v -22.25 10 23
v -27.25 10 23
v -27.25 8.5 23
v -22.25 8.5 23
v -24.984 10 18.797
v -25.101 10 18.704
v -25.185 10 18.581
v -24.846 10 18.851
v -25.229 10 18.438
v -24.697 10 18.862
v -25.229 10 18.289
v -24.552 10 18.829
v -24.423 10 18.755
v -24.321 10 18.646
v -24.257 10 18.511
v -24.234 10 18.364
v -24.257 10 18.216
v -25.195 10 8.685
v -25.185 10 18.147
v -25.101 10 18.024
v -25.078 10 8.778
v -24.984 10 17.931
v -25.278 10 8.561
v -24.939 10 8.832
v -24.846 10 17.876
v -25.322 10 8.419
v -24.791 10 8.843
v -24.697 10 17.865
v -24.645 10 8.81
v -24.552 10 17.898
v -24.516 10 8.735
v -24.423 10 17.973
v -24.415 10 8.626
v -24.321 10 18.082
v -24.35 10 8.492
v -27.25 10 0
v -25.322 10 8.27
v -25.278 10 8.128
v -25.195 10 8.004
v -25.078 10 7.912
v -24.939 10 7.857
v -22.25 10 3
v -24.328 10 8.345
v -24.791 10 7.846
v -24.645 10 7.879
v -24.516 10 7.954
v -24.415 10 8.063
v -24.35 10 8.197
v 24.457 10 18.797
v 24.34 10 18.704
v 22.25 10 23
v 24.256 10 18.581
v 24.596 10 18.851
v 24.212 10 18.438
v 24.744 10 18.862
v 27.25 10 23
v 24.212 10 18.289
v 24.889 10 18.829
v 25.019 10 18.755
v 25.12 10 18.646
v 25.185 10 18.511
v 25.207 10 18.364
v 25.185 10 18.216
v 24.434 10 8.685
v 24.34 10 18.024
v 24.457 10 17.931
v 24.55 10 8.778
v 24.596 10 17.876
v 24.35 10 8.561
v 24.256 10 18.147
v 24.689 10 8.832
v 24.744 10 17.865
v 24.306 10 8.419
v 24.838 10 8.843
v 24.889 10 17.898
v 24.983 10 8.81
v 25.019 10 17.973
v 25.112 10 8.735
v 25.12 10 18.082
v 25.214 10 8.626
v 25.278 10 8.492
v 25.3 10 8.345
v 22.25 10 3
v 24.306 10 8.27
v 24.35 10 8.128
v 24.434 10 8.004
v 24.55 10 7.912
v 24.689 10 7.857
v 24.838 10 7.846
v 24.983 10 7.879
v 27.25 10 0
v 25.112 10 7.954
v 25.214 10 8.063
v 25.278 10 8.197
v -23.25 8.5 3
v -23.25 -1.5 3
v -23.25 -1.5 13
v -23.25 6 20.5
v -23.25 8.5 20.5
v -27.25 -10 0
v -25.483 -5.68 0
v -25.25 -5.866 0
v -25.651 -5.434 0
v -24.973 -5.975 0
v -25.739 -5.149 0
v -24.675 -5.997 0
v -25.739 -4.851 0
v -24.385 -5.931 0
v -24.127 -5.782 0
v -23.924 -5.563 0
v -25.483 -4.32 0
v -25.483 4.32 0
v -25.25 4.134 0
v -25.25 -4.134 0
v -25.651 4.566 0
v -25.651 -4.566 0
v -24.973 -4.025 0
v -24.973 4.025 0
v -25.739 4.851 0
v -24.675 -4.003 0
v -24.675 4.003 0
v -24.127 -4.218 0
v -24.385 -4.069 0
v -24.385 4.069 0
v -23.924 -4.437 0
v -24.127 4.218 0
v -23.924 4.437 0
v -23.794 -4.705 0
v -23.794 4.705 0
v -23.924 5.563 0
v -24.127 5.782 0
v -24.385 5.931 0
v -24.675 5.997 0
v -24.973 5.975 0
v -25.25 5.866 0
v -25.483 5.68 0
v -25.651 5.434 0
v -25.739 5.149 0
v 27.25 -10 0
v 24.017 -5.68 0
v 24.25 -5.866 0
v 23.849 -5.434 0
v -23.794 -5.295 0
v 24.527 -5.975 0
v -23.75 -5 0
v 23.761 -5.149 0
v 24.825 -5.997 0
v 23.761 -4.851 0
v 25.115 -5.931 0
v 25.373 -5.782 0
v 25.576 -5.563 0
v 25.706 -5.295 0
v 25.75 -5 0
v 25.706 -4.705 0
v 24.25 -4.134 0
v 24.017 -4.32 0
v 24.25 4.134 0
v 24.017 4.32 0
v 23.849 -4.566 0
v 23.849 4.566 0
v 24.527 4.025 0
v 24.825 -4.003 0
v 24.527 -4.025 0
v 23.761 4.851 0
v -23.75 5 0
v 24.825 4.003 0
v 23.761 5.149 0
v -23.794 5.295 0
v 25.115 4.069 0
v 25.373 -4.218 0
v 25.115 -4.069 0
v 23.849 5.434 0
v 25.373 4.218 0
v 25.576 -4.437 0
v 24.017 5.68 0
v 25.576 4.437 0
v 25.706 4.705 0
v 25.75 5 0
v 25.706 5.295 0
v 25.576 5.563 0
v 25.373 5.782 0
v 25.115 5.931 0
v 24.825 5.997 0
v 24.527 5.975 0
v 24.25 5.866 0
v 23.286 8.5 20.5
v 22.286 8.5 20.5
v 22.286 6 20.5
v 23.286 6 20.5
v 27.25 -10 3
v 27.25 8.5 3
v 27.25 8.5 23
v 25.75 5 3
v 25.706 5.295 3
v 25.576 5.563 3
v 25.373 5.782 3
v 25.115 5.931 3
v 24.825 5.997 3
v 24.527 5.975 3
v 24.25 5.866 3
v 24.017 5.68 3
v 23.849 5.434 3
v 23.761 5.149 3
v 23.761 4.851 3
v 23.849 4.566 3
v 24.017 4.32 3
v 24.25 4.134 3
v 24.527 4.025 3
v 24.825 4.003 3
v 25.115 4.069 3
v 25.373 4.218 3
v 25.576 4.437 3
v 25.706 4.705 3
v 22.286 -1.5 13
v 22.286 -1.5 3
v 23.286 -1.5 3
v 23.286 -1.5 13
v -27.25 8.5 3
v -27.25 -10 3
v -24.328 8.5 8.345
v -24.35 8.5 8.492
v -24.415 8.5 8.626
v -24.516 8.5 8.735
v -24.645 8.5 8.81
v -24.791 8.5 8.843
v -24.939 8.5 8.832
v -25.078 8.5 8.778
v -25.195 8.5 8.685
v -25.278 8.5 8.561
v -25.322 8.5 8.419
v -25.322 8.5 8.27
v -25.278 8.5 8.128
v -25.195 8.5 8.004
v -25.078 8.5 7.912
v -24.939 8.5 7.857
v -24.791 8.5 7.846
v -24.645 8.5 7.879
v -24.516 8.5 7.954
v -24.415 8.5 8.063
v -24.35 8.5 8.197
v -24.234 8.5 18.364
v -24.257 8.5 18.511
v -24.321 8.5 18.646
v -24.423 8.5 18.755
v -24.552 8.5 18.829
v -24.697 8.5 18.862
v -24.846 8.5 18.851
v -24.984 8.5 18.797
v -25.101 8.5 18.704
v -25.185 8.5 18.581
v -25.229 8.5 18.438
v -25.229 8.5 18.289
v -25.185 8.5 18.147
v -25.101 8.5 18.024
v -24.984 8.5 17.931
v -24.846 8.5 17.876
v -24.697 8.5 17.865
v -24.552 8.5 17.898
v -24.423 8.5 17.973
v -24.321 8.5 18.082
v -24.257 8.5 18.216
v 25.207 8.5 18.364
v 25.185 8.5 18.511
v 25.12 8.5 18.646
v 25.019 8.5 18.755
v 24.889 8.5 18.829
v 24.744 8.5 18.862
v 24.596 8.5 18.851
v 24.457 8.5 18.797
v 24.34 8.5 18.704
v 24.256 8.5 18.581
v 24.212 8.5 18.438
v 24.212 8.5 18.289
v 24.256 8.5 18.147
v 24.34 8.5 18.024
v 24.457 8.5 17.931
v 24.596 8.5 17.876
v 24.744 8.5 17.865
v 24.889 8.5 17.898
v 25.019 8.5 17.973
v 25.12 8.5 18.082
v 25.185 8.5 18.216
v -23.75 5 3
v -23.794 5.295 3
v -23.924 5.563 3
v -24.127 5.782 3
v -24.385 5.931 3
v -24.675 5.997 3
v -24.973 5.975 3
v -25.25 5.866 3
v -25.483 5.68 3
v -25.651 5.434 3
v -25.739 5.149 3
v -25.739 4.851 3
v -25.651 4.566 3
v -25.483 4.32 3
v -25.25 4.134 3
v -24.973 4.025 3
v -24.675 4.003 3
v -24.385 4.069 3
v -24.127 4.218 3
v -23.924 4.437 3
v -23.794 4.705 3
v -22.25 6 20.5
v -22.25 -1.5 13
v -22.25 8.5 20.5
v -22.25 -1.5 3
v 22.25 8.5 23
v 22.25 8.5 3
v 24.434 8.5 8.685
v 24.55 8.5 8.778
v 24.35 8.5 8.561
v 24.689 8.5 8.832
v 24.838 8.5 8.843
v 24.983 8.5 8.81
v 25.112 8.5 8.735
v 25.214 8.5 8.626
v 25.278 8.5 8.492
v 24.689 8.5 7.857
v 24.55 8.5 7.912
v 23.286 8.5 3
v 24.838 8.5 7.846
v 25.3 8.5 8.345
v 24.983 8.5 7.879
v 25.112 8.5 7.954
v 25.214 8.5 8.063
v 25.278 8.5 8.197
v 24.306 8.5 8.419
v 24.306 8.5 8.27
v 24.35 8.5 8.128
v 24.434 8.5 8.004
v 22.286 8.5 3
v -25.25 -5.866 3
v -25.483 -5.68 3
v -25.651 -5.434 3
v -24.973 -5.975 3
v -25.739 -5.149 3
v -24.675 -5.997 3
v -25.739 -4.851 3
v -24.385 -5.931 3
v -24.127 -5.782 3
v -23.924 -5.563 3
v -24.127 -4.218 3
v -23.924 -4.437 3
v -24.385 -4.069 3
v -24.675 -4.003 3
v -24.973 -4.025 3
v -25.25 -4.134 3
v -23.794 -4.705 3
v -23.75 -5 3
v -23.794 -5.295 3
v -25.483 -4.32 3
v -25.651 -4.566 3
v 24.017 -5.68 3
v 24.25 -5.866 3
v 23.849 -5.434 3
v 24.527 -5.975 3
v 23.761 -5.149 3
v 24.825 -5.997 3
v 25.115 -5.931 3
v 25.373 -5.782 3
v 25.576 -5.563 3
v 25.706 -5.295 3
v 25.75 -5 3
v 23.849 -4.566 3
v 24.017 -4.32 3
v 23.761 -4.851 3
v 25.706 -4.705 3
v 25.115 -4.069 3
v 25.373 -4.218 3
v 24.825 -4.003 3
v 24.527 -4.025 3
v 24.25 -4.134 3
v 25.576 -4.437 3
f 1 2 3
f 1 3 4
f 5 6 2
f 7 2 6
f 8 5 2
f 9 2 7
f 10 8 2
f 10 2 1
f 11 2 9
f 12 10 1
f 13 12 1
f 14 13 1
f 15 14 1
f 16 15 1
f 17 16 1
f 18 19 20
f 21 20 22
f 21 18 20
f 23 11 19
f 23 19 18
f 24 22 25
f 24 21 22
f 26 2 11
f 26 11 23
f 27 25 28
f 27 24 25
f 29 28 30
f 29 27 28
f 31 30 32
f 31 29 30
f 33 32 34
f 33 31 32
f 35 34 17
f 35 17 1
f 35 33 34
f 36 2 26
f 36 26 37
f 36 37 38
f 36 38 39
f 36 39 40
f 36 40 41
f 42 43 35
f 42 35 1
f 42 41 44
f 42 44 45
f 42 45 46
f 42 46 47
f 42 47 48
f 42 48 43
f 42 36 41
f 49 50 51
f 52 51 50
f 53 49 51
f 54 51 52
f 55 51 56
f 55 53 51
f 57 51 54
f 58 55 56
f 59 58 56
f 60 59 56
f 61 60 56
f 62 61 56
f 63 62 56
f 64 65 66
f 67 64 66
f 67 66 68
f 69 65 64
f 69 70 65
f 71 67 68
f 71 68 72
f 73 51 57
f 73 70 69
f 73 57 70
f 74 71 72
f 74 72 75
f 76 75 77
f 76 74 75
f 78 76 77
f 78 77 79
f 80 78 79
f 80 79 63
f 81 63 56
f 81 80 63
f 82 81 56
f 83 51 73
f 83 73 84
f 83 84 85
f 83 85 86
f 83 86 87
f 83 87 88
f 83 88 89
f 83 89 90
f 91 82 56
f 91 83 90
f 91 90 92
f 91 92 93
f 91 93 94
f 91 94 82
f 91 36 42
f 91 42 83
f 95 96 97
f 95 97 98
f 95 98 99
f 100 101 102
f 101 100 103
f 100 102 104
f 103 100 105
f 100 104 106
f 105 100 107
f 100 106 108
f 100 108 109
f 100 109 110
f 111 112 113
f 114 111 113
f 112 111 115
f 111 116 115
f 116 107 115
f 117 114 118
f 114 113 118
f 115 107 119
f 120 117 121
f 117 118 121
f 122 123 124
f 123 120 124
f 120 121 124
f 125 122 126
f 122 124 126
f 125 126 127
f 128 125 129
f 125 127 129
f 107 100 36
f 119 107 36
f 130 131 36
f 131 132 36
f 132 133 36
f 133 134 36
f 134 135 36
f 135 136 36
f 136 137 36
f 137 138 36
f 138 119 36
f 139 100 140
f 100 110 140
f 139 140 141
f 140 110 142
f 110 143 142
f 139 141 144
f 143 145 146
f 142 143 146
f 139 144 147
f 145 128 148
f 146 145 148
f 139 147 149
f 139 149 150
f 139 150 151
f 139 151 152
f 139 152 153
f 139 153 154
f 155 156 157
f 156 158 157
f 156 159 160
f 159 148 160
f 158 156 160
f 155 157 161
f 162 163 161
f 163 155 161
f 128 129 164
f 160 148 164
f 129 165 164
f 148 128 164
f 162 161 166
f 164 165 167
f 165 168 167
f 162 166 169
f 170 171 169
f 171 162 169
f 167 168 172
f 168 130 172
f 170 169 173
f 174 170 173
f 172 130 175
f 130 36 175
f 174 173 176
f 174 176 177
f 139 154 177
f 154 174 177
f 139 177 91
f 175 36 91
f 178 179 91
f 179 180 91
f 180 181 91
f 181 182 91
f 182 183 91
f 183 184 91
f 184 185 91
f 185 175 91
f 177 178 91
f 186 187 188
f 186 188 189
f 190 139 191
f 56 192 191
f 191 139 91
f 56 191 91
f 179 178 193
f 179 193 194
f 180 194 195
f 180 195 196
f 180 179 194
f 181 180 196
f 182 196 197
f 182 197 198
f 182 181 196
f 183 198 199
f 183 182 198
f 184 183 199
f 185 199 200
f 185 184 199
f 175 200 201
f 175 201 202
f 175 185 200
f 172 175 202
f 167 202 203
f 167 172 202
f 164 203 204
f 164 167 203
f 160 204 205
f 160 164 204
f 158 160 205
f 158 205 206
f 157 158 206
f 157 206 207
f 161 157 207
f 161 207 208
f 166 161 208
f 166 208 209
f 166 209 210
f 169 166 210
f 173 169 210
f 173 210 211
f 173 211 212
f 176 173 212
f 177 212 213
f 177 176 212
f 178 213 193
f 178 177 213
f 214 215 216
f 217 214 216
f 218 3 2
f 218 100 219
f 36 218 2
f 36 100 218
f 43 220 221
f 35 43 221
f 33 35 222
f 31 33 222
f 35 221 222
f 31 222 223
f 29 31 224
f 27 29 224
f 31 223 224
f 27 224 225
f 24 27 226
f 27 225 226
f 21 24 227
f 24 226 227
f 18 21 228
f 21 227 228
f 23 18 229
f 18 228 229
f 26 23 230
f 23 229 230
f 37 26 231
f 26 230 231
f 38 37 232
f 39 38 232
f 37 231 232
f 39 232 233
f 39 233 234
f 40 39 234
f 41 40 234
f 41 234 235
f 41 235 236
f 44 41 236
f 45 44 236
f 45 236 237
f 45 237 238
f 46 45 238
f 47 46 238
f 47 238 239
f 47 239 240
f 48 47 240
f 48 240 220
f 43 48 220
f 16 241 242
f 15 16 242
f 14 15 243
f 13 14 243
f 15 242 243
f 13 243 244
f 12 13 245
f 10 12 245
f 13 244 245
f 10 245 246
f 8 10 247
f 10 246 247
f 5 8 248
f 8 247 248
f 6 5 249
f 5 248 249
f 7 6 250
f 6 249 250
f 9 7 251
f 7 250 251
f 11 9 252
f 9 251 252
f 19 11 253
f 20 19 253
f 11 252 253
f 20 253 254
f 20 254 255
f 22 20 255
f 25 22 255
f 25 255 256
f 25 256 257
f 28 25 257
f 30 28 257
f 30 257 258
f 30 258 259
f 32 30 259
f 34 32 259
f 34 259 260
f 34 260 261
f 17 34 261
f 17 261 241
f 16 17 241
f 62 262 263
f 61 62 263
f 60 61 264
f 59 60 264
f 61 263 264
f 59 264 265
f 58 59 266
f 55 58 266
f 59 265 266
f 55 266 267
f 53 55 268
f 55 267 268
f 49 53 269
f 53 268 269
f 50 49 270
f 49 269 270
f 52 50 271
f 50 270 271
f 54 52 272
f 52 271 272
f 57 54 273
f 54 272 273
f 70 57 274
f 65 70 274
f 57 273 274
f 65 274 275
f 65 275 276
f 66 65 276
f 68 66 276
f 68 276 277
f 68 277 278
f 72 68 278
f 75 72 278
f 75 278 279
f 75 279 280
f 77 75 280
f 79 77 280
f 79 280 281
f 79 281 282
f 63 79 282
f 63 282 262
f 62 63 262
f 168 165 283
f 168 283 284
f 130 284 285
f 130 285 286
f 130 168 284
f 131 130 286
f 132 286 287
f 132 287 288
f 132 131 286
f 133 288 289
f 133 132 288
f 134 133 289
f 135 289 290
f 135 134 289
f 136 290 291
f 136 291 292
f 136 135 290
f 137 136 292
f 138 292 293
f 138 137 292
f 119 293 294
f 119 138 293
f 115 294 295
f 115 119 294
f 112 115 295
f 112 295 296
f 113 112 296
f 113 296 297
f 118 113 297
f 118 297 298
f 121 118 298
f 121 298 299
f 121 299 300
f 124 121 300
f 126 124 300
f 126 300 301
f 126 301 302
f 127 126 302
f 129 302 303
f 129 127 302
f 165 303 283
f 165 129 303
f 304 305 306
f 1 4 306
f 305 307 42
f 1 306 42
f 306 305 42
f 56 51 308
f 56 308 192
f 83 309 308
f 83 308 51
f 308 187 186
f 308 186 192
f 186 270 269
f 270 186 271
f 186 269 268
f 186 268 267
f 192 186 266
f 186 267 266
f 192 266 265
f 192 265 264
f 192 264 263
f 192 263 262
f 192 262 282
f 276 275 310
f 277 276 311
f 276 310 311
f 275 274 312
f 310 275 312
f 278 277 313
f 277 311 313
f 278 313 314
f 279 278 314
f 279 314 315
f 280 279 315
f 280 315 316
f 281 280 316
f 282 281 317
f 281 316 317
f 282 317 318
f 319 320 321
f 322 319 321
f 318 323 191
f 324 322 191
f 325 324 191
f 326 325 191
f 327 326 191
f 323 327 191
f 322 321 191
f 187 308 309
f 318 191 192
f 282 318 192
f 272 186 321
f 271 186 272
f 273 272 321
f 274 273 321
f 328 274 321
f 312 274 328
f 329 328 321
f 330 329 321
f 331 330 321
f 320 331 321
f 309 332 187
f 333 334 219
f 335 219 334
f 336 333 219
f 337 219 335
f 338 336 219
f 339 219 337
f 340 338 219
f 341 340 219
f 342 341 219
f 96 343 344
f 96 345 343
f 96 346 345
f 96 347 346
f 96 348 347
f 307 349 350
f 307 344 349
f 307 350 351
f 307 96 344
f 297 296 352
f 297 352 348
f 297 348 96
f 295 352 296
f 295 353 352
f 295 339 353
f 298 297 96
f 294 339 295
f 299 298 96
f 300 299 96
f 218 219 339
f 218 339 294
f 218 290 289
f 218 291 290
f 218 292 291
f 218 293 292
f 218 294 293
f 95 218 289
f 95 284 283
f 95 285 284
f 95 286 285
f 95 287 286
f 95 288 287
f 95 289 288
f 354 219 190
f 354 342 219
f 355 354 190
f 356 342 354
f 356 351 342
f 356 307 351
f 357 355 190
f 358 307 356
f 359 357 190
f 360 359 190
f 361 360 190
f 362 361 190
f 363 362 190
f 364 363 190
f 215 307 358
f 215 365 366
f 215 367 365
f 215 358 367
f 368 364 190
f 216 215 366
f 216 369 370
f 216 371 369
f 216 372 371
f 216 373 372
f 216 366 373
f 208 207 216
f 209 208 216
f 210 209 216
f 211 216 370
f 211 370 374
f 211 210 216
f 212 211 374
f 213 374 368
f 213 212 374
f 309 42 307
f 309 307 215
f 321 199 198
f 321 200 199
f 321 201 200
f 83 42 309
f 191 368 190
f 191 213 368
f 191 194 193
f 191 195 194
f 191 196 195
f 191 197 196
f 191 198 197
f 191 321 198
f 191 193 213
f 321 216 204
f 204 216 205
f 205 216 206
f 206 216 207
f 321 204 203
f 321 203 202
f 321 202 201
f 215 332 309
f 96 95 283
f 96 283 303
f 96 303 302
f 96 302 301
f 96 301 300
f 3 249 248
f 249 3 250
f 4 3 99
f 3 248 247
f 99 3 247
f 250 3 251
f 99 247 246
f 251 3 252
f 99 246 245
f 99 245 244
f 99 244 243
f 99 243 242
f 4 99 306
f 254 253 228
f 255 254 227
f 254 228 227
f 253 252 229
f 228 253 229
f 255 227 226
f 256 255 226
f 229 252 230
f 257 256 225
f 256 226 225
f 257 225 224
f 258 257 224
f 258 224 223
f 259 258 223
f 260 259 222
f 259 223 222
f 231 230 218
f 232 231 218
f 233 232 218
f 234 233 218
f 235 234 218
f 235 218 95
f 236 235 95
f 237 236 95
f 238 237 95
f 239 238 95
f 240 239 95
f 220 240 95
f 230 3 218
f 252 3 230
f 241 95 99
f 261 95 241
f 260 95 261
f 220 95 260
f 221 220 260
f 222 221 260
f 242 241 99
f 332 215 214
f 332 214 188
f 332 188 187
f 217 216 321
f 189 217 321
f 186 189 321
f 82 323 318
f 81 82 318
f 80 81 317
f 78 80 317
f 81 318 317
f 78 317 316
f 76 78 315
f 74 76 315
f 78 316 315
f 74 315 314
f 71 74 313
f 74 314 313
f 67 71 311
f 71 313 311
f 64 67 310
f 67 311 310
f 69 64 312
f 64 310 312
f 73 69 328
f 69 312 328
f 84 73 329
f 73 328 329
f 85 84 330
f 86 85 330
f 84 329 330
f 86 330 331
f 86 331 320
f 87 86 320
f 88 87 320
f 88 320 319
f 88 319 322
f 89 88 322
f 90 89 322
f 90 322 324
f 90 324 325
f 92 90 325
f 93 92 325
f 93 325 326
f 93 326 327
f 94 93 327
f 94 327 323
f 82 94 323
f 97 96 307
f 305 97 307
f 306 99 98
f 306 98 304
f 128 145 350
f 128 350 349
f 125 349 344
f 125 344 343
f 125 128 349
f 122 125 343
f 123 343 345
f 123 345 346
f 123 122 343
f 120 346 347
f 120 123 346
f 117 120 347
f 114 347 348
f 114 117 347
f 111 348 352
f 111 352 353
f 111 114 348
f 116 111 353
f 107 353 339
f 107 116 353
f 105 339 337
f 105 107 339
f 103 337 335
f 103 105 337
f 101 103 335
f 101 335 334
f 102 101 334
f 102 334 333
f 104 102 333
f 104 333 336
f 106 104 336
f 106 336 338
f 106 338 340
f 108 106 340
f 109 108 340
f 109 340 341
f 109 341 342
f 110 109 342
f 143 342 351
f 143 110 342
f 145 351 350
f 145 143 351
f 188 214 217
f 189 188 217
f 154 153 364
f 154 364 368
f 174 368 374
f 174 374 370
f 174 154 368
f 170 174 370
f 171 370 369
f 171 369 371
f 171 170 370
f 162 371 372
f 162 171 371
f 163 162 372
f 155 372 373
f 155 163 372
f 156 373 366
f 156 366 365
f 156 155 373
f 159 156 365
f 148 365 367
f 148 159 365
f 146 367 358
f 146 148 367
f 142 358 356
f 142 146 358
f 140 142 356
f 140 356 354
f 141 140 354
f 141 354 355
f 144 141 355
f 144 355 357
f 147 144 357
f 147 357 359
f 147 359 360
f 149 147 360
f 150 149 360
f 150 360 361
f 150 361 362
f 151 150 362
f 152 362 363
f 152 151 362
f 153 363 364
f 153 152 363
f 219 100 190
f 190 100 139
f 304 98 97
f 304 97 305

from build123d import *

# Parameters (mm, degrees)
F0_W     = 54.5
F0_H     = 20
F0_R     = 1
F1_DEPTH = 3
F2_W     = 5
F2_H     = 1.5
F3_DEPTH = 20
F4_W     = 1
F4_H     = 10
F5_DEPTH = 17.5
F6_SIZE  = 7.5
F8_D     = 1


# Not quite as in the source:
# - a feature names something its author has since deleted; it is built from what else it names


with BuildPart() as f1:
    # F0 (on Top) → F1 (new body)
    with BuildSketch(Plane.XY):
        Rectangle(F0_W, F0_H)
        with Locations((-24.75, -5)):
            Circle(F0_R, mode=Mode.SUBTRACT)
        with Locations((24.75, -5)):
            Circle(F0_R, mode=Mode.SUBTRACT)
        with Locations((-24.75, 5)):
            Circle(F0_R, mode=Mode.SUBTRACT)
        with Locations((24.75, 5)):
            Circle(F0_R, mode=Mode.SUBTRACT)
    extrude(amount=F1_DEPTH)

    # F2 (on face) → F3 (join)
    with BuildSketch(Plane.XY.offset(3)):
        with Locations((-24.75, 9.25)):
            Rectangle(F2_W, F2_H)
        with Locations((24.75, 9.25)):
            Rectangle(F2_W, F2_H)
    extrude(amount=F3_DEPTH)

    # F4 (on face) → F5 (join)
    with BuildSketch(Plane.XY.offset(3)):
        with Locations((-22.75, 3.5)):
            Rectangle(F4_W, F4_H)
        with Locations((22.7855359316, 3.5)):
            Rectangle(F4_W, F4_H)
    extrude(amount=F5_DEPTH)

    # F6
    f6_edges = [f1.edges().sort_by_distance(p)[0] for p in [
        (-22.75, -1.5, 20.5),
        (22.785536, -1.5, 20.5),
    ]]
    chamfer(f6_edges, length=F6_SIZE)

    # F8 (through all)
    with Locations(Plane(origin=(0, 10, 0), x_dir=(-1, 0, 0), z_dir=(0, 1, 0))):
        with Locations((24.8279795051, 8.3445450291), (24.7343406081, 18.3638688177), (-24.8004421592, 8.3445450291), (-24.7068032622, 18.3638688177)):
            Hole(F8_D / 2)


solid = f1.part
